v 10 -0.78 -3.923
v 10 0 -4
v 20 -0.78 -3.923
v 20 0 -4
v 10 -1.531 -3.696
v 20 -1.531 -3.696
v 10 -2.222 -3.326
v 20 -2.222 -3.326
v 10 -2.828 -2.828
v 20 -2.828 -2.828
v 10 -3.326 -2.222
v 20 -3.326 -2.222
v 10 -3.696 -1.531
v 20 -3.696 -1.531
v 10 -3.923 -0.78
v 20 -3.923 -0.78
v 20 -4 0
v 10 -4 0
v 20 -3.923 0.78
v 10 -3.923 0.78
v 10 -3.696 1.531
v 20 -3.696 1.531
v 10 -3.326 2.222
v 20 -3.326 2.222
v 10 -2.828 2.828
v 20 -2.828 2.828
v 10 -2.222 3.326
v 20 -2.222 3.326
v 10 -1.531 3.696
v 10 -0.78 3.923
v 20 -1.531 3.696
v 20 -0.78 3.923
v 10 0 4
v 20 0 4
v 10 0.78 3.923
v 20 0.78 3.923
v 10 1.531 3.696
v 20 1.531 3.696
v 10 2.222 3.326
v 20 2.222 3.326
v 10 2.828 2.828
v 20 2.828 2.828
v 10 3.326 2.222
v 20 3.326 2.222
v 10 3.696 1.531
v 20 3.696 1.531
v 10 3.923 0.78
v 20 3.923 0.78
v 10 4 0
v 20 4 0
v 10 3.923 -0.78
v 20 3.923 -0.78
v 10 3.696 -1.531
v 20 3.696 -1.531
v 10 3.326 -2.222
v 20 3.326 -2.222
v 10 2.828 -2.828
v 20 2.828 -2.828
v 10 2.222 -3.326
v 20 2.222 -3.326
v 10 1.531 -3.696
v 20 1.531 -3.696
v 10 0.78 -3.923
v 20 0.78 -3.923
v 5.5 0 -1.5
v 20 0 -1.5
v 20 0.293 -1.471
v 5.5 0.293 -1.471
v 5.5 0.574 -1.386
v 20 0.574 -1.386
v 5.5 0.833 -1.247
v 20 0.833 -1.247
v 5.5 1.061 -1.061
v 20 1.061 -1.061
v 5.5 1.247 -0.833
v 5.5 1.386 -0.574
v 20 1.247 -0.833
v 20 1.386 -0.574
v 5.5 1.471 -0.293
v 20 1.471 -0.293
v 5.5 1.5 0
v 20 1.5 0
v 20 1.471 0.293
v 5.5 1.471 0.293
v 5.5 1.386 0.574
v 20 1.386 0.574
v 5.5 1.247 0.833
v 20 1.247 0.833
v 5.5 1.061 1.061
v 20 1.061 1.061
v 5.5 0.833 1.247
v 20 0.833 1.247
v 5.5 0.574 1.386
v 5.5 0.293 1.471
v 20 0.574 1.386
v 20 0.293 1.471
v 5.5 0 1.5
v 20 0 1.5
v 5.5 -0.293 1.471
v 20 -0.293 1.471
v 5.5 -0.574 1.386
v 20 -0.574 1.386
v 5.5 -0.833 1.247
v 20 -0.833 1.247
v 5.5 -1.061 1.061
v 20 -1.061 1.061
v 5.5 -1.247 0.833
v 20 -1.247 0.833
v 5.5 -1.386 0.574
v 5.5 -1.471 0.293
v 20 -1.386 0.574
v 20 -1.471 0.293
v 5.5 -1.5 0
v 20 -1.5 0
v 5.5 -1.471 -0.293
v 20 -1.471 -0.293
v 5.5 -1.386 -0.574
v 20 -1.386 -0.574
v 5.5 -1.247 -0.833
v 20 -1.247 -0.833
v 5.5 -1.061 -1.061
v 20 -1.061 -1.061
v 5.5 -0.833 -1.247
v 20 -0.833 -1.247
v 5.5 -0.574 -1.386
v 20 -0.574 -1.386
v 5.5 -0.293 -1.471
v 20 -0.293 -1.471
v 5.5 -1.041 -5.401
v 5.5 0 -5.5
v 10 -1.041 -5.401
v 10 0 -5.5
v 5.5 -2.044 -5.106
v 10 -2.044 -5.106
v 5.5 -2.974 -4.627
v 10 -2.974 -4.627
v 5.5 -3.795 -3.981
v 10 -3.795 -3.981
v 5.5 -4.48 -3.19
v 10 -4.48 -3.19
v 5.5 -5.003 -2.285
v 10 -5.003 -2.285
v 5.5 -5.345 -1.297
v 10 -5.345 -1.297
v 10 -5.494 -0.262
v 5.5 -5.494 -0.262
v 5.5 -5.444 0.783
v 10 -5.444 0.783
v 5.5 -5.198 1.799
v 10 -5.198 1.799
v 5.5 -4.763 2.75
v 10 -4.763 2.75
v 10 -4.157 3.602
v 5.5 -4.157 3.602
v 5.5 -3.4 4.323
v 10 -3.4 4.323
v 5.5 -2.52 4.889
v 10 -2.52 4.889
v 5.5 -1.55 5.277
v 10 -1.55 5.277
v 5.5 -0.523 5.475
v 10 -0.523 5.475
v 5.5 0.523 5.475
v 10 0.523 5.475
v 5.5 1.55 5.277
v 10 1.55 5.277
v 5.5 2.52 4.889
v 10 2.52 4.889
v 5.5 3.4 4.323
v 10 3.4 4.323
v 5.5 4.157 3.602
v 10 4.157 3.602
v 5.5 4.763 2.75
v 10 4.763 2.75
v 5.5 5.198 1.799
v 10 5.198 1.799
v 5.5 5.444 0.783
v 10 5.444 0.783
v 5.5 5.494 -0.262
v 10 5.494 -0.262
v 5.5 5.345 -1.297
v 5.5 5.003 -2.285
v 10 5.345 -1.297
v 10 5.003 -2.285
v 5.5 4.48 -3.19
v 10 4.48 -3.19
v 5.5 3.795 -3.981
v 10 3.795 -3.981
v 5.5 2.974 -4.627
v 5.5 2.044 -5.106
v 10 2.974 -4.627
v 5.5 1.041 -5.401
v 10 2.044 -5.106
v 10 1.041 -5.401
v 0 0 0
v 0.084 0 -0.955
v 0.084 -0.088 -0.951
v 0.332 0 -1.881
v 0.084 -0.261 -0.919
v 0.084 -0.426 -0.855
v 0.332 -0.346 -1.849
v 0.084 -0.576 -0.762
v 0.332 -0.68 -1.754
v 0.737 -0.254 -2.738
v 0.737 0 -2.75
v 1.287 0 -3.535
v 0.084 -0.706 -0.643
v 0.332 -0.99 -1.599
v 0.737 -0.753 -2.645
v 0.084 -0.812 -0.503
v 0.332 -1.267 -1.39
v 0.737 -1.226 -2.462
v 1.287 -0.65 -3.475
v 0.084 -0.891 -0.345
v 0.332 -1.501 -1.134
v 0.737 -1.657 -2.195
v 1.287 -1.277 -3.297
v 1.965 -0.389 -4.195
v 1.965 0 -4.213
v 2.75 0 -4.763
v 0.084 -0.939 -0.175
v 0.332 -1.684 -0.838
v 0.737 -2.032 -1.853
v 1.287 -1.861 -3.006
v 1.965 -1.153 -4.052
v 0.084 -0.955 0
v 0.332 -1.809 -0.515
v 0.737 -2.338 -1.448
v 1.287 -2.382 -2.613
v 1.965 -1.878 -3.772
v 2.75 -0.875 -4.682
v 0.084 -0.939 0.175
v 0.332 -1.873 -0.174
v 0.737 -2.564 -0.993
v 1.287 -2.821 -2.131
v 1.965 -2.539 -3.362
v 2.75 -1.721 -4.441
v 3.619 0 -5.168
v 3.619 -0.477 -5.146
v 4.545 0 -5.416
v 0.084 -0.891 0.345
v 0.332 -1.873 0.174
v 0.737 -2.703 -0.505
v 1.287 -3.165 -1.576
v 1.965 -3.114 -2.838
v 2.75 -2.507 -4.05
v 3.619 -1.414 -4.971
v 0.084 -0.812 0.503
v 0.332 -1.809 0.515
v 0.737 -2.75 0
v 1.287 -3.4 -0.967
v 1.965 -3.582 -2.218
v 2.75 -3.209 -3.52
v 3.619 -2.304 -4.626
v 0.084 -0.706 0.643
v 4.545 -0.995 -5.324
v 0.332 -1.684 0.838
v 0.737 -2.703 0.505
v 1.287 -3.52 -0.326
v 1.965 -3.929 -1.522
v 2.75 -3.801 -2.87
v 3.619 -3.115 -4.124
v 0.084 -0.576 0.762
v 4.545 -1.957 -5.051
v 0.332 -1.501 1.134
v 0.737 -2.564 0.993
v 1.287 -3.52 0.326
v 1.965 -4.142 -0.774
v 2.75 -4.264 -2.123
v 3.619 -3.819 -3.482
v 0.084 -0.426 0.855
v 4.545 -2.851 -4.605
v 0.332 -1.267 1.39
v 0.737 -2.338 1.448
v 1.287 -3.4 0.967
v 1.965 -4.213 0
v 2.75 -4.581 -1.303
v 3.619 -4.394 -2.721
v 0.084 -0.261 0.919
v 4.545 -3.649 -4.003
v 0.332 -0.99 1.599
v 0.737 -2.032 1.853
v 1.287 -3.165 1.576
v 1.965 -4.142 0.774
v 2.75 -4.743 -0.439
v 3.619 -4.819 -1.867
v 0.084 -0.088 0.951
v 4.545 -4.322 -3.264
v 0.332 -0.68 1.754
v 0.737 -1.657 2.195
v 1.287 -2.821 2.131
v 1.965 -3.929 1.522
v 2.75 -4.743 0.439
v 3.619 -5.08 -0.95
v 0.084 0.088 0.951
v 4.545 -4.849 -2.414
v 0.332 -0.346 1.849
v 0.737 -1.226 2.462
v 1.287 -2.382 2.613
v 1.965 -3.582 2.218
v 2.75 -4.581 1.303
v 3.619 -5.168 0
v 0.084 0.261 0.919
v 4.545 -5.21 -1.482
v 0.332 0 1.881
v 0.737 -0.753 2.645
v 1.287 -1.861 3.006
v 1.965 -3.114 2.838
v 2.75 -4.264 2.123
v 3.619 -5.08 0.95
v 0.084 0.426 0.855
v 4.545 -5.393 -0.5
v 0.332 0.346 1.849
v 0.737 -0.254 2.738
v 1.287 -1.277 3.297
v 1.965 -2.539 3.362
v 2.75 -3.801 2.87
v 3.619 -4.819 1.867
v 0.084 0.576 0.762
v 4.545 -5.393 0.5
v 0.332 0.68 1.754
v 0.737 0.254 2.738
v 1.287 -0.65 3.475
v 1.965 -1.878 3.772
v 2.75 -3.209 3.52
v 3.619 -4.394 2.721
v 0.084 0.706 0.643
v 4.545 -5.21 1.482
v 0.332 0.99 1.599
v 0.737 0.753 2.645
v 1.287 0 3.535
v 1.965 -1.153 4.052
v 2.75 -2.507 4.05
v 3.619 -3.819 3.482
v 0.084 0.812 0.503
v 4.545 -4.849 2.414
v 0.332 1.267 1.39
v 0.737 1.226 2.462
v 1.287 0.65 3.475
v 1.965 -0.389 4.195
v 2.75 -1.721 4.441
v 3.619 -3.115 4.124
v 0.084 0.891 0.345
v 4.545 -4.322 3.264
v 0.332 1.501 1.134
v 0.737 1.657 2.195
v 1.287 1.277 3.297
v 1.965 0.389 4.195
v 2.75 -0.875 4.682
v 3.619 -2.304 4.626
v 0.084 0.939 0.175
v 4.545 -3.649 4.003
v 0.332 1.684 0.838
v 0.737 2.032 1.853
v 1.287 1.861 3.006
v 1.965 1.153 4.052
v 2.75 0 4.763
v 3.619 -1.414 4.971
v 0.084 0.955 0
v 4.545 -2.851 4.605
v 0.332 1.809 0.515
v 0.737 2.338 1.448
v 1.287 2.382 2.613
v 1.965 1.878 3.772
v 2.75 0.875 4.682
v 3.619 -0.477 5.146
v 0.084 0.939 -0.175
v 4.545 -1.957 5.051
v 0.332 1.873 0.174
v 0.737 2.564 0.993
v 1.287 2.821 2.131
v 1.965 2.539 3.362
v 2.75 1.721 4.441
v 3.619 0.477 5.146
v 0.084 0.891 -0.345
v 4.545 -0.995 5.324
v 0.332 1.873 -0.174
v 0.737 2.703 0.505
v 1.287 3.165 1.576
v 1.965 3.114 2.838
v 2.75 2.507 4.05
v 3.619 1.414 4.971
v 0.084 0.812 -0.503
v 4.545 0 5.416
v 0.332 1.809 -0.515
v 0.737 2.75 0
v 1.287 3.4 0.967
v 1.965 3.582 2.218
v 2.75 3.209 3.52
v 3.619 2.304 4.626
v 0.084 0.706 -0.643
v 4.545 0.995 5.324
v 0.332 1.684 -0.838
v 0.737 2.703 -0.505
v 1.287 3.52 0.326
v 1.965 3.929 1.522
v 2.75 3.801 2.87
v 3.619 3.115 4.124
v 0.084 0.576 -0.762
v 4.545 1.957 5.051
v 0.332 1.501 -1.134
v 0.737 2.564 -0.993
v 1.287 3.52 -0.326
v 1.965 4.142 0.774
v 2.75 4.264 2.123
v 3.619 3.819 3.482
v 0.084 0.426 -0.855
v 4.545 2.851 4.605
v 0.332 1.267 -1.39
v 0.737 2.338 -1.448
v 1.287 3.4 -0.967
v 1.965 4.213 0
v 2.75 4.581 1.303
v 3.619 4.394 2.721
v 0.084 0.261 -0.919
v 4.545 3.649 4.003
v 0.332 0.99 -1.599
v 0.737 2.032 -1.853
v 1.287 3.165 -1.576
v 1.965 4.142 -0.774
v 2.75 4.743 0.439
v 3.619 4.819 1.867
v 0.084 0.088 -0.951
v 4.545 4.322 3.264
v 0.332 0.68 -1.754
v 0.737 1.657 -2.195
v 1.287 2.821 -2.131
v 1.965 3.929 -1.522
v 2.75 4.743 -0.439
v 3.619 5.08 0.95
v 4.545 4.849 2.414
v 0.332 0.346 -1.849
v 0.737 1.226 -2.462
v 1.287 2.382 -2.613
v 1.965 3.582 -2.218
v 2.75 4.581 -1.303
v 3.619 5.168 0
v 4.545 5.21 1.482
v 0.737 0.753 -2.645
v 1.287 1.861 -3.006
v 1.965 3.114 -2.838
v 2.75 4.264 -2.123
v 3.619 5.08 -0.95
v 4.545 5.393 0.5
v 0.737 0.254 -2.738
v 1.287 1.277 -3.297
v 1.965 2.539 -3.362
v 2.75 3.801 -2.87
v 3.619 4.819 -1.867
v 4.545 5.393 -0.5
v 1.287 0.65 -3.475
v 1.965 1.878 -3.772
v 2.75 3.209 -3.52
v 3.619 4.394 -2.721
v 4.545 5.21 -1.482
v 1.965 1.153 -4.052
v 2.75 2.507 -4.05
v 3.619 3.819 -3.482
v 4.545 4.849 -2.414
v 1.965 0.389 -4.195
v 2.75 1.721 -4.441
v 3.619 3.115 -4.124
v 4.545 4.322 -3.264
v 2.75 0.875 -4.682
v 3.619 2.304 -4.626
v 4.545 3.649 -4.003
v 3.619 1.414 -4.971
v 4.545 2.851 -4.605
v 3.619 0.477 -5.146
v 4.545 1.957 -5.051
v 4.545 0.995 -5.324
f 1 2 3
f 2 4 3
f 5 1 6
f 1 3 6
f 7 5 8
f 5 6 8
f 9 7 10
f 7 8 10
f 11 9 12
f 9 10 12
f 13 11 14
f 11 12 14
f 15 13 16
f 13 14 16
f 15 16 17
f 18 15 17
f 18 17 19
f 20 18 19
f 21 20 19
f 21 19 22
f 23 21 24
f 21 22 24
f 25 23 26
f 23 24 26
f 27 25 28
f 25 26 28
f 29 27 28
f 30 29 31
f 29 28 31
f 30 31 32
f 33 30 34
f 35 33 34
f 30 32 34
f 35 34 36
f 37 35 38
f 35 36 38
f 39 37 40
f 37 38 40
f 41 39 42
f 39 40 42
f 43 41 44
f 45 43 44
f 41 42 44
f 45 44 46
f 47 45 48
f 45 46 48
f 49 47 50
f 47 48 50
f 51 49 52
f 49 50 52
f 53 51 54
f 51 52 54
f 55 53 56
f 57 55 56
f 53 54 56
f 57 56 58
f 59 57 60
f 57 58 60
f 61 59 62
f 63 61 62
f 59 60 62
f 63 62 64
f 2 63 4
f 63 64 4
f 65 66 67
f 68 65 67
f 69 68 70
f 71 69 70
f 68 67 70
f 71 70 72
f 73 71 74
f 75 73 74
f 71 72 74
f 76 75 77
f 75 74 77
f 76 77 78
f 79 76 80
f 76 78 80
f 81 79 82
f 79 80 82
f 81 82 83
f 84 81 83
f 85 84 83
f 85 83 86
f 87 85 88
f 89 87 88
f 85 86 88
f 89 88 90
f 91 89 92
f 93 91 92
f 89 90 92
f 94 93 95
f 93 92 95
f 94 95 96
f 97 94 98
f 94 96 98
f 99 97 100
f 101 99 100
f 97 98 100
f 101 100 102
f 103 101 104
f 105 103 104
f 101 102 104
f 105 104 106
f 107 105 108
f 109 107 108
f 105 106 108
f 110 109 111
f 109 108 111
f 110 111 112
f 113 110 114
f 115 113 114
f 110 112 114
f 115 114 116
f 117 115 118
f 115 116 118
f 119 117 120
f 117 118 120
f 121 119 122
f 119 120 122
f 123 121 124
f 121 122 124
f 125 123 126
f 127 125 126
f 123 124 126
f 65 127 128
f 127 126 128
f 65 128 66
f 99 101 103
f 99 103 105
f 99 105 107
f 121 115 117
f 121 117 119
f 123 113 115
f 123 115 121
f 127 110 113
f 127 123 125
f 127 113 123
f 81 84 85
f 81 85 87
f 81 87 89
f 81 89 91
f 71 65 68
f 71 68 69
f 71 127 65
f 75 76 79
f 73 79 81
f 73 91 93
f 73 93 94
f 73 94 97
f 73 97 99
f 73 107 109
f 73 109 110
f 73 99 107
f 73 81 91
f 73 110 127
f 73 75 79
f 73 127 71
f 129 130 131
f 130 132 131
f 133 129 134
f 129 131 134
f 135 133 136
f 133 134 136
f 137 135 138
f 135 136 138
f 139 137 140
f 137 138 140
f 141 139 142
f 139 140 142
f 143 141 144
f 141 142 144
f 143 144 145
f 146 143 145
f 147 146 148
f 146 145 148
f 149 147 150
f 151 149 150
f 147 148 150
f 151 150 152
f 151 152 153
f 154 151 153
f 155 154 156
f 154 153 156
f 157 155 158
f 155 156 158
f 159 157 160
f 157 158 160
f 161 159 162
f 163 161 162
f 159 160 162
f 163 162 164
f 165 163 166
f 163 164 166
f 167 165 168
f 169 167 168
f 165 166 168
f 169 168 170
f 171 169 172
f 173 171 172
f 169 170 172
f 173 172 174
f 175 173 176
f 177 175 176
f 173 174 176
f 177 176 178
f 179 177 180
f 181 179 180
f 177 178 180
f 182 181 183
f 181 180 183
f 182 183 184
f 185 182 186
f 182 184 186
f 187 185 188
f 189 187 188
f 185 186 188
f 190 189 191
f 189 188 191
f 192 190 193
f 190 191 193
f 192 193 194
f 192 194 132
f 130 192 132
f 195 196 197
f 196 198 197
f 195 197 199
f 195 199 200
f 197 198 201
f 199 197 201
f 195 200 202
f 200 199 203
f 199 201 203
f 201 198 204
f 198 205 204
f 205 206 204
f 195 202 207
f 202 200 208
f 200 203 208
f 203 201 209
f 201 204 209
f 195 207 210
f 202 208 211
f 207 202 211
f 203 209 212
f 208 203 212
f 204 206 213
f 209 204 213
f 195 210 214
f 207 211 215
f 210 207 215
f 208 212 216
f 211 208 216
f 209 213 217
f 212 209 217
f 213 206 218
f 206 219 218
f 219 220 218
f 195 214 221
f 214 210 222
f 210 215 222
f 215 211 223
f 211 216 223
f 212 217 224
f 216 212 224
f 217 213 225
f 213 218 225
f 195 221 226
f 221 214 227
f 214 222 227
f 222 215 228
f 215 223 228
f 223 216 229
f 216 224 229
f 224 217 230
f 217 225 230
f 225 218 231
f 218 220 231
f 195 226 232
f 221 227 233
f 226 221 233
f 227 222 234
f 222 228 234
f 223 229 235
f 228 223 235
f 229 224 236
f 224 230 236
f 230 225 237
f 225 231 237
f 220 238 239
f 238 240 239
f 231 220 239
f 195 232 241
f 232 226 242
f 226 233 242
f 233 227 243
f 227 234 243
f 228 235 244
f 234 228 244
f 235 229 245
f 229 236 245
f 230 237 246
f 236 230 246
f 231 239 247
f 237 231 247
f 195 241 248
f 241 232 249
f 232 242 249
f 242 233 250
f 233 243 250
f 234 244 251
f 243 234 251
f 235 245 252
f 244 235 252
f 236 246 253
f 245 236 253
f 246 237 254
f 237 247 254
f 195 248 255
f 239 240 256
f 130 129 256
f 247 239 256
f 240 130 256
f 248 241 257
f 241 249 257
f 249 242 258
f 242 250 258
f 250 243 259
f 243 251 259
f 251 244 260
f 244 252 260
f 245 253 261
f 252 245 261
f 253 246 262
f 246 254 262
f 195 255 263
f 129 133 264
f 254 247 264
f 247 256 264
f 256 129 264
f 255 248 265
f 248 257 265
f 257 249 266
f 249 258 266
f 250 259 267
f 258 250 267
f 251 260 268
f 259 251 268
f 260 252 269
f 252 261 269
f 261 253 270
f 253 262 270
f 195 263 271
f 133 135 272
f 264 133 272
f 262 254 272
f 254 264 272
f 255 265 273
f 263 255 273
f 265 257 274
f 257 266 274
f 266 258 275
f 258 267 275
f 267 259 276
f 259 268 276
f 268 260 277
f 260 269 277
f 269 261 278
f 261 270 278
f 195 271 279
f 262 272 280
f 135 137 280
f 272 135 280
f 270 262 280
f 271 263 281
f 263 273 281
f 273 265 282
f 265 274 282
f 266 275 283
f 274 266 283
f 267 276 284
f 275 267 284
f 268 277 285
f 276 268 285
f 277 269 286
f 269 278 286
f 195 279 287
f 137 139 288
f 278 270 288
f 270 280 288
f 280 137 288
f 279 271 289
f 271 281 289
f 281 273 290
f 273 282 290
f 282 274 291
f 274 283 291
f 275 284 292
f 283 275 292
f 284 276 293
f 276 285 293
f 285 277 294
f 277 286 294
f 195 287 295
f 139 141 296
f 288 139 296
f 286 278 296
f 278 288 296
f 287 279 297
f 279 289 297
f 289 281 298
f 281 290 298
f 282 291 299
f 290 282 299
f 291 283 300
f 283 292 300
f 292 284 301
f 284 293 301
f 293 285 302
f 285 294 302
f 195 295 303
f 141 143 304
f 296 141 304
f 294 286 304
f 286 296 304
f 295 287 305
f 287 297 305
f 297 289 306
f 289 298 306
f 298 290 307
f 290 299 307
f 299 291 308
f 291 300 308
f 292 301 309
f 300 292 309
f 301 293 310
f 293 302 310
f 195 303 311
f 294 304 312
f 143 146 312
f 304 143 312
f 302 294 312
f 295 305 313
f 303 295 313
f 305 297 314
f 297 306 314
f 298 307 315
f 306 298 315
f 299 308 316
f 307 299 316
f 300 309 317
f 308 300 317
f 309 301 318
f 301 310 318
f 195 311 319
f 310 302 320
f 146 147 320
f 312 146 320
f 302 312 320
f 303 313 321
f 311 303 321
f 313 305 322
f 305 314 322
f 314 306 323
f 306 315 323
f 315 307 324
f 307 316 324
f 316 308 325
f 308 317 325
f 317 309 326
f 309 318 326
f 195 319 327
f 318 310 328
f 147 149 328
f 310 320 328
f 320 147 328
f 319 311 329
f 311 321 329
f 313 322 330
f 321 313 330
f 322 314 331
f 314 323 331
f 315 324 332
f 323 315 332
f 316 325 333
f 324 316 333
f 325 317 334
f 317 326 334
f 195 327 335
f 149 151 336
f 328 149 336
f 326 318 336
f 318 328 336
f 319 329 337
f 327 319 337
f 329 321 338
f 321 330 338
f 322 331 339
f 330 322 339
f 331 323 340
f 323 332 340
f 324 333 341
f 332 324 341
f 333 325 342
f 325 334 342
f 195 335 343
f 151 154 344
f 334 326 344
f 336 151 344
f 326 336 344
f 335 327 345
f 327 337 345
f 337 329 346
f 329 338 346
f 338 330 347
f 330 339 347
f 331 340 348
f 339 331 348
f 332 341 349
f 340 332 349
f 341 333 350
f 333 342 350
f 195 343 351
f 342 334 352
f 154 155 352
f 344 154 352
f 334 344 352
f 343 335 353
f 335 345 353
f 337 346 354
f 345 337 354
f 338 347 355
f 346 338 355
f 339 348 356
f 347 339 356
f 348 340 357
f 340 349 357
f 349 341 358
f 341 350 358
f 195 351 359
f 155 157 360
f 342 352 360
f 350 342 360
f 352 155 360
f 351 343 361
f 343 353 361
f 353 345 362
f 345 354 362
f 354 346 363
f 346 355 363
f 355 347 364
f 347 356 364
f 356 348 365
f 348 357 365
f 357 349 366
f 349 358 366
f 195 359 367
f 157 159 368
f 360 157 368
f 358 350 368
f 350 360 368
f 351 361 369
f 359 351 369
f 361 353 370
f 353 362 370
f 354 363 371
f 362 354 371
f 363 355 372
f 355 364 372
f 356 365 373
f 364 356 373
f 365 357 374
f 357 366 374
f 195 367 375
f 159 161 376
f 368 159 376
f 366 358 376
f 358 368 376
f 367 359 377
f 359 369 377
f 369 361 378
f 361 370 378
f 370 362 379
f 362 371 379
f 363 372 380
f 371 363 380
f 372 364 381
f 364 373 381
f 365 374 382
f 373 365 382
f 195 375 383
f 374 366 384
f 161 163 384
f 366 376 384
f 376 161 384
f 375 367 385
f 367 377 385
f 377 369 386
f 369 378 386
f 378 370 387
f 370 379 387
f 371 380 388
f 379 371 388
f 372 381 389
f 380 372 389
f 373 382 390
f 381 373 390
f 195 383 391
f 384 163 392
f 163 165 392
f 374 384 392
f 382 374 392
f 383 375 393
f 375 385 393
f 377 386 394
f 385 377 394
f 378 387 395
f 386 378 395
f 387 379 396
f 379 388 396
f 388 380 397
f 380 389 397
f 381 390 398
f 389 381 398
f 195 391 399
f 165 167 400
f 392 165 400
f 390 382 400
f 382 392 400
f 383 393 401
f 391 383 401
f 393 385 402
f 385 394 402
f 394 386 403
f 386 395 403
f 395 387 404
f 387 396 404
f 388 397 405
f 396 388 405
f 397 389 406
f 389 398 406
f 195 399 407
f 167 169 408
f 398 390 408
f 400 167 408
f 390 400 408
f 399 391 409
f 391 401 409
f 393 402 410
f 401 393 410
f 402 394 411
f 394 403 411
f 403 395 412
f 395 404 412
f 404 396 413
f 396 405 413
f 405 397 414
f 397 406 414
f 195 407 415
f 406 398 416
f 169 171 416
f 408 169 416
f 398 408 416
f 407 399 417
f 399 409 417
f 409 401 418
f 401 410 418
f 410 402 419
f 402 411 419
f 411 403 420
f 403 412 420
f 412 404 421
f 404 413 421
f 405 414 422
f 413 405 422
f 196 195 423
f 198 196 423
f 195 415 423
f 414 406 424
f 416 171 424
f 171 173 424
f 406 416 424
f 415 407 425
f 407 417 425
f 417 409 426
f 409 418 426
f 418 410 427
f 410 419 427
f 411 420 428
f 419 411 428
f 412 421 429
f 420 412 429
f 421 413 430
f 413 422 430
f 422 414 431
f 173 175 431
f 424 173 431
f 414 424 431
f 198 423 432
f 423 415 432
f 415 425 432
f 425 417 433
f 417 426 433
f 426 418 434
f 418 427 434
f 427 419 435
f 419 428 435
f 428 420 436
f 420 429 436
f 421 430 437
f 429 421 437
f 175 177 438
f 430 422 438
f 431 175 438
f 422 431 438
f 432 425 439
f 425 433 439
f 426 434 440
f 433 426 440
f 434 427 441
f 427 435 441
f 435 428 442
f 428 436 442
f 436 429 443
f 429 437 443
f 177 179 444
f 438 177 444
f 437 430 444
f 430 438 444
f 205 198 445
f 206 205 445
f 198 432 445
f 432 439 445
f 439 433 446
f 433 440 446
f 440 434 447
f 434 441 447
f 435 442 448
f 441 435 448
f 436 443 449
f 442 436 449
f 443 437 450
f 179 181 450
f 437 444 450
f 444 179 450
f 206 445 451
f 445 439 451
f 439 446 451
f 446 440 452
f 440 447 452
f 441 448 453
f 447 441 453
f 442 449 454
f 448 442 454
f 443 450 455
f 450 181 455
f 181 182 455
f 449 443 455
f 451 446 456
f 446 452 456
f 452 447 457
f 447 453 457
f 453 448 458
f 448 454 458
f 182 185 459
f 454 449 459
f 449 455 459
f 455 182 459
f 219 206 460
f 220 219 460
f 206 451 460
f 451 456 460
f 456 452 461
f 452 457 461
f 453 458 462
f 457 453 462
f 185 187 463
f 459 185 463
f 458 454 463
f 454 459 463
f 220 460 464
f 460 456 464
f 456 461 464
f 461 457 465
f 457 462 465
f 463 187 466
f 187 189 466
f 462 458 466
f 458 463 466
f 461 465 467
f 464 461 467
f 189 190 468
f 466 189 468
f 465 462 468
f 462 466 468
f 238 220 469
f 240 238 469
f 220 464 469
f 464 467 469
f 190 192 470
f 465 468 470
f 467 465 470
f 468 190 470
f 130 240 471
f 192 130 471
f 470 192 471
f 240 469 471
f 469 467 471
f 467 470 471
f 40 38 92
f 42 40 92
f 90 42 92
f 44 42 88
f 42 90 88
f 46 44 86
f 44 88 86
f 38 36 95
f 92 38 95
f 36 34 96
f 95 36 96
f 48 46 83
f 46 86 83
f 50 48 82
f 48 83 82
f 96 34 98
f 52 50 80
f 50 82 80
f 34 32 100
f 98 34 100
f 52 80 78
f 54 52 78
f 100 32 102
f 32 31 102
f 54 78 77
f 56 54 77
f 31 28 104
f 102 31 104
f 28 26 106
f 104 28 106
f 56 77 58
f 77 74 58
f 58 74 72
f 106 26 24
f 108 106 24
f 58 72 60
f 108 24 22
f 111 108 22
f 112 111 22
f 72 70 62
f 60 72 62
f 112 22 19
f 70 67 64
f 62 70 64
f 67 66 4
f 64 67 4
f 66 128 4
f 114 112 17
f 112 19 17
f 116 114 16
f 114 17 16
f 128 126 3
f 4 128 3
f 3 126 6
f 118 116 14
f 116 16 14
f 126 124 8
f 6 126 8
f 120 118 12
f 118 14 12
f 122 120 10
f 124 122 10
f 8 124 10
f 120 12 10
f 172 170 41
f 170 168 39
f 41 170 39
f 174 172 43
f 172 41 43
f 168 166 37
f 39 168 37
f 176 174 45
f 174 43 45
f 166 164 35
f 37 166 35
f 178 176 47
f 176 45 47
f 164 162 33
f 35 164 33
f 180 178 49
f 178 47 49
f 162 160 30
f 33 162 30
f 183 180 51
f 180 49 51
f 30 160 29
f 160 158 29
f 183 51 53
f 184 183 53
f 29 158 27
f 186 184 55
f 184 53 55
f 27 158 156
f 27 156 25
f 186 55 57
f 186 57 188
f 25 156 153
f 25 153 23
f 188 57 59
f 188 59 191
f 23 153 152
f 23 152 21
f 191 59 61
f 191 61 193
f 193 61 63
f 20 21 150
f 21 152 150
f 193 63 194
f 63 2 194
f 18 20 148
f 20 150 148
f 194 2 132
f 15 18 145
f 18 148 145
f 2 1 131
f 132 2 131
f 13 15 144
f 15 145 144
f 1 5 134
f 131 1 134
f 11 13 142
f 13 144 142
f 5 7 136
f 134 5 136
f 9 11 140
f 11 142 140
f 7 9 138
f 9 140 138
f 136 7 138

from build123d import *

# Parameters (mm, degrees)
SKETCH4_R          = 1.5
CUT_EXTRUDE1_DEPTH = 14.5


with BuildPart() as part:
    # Sketch3 → Revolve1 (revolve)
    with BuildSketch(Plane.XY, mode=Mode.PRIVATE) as revolve1_sk:
        with BuildLine():
            Line((5.5, 5.5), (10, 5.5))
            Line((10, 5.5), (10, 4))
            Line((10, 4), (20, 4))
            Line((20, 4), (20, 0))
            Line((20, 0), (0, 0))
            ThreePointArc((0, 0), (1.610912703, 3.889087297), (5.5, 5.5))
        make_face()
    revolve(revolve1_sk.sketch.rotate(Axis((0, 0, 0), (-1, 0, 0)), 90), axis=Axis((0, 0, 0), (-1, 0, 0)))

    # Sketch4 → Cut-Extrude1 (cut)
    with BuildSketch(Plane(origin=(20, 0, 0), x_dir=(0, 0, -1), z_dir=(1, 0, 0))):
        Circle(SKETCH4_R)
    extrude(amount=-CUT_EXTRUDE1_DEPTH, mode=Mode.SUBTRACT)


solid = part.part
